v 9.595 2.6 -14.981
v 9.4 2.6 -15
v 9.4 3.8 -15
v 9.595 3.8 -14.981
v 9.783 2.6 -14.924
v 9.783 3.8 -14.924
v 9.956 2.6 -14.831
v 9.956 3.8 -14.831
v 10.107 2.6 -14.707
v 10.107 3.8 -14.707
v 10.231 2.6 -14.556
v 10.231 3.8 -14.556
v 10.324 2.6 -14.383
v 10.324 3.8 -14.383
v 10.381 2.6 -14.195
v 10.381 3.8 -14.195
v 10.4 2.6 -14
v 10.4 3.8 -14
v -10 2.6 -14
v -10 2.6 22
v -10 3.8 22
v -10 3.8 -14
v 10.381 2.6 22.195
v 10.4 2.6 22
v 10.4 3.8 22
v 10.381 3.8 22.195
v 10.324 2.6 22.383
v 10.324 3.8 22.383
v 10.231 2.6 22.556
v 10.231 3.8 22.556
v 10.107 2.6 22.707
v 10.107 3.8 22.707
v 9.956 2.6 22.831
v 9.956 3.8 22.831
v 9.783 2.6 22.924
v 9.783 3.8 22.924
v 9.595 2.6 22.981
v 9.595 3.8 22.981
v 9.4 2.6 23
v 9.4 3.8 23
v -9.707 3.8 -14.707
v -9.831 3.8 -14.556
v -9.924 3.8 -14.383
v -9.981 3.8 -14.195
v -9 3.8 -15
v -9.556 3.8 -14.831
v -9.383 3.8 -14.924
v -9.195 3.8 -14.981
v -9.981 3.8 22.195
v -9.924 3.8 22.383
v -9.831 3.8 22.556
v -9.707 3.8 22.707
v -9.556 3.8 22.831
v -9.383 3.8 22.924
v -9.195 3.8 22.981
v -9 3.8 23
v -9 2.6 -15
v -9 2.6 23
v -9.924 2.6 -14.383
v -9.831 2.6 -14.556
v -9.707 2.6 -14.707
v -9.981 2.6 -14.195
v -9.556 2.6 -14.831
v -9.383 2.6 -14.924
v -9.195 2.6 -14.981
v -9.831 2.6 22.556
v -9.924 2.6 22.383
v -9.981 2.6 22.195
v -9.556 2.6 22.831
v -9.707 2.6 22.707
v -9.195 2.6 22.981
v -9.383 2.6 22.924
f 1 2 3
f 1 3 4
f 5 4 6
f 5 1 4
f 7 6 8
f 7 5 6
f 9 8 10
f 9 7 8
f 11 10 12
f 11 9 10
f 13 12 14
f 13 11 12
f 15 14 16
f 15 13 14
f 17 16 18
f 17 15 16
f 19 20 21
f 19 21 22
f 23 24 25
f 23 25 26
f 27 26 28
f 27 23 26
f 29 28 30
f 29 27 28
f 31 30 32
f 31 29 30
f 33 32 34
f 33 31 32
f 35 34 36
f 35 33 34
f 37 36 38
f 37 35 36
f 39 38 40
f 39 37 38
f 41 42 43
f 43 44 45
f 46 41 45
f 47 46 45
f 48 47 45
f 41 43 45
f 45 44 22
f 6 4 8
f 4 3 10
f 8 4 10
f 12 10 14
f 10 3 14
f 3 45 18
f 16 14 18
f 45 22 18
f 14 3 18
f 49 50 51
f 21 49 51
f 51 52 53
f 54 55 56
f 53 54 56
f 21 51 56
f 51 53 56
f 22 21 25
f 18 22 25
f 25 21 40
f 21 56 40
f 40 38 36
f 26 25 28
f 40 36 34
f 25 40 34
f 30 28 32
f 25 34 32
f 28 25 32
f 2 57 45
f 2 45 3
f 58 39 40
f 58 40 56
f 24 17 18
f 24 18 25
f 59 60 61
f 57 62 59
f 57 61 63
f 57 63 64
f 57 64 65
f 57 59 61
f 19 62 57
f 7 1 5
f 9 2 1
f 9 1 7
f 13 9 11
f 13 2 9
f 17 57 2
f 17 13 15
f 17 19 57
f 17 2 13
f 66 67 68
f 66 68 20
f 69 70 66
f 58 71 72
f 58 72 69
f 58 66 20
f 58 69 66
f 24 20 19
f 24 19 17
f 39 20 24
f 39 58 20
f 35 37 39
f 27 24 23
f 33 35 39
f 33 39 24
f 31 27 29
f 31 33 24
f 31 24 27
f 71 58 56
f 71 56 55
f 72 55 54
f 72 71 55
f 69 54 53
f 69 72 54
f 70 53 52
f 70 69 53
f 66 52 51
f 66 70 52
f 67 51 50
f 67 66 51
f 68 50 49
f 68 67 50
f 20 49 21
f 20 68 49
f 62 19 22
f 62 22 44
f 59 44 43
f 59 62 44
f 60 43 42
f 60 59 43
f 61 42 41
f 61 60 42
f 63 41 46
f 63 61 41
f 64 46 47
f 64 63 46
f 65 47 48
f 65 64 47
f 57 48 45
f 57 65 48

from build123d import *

# Parameters (mm, degrees)
BOSS_EXTRUDE1_DEPTH = 1.2


with BuildPart() as part:
    # Sketch1 → Boss-Extrude1 (new body)
    with BuildSketch(Plane.XZ.offset(-2.6)):
        with BuildLine():
            Line((10.4, -14), (10.4, 22))
            ThreePointArc((10.4, 22), (10.107106781, 22.707106781), (9.4, 23))
            Line((9.4, 23), (-9, 23))
            ThreePointArc((-9, 23), (-9.707106781, 22.707106781), (-10, 22))
            Line((-10, 22), (-10, -14))
            ThreePointArc((-10, -14), (-9.707106781, -14.707106781), (-9, -15))
            Line((-9, -15), (9.4, -15))
            ThreePointArc((9.4, -15), (10.107106781, -14.707106781), (10.4, -14))
        make_face()
    extrude(amount=-BOSS_EXTRUDE1_DEPTH)


solid = part.part
